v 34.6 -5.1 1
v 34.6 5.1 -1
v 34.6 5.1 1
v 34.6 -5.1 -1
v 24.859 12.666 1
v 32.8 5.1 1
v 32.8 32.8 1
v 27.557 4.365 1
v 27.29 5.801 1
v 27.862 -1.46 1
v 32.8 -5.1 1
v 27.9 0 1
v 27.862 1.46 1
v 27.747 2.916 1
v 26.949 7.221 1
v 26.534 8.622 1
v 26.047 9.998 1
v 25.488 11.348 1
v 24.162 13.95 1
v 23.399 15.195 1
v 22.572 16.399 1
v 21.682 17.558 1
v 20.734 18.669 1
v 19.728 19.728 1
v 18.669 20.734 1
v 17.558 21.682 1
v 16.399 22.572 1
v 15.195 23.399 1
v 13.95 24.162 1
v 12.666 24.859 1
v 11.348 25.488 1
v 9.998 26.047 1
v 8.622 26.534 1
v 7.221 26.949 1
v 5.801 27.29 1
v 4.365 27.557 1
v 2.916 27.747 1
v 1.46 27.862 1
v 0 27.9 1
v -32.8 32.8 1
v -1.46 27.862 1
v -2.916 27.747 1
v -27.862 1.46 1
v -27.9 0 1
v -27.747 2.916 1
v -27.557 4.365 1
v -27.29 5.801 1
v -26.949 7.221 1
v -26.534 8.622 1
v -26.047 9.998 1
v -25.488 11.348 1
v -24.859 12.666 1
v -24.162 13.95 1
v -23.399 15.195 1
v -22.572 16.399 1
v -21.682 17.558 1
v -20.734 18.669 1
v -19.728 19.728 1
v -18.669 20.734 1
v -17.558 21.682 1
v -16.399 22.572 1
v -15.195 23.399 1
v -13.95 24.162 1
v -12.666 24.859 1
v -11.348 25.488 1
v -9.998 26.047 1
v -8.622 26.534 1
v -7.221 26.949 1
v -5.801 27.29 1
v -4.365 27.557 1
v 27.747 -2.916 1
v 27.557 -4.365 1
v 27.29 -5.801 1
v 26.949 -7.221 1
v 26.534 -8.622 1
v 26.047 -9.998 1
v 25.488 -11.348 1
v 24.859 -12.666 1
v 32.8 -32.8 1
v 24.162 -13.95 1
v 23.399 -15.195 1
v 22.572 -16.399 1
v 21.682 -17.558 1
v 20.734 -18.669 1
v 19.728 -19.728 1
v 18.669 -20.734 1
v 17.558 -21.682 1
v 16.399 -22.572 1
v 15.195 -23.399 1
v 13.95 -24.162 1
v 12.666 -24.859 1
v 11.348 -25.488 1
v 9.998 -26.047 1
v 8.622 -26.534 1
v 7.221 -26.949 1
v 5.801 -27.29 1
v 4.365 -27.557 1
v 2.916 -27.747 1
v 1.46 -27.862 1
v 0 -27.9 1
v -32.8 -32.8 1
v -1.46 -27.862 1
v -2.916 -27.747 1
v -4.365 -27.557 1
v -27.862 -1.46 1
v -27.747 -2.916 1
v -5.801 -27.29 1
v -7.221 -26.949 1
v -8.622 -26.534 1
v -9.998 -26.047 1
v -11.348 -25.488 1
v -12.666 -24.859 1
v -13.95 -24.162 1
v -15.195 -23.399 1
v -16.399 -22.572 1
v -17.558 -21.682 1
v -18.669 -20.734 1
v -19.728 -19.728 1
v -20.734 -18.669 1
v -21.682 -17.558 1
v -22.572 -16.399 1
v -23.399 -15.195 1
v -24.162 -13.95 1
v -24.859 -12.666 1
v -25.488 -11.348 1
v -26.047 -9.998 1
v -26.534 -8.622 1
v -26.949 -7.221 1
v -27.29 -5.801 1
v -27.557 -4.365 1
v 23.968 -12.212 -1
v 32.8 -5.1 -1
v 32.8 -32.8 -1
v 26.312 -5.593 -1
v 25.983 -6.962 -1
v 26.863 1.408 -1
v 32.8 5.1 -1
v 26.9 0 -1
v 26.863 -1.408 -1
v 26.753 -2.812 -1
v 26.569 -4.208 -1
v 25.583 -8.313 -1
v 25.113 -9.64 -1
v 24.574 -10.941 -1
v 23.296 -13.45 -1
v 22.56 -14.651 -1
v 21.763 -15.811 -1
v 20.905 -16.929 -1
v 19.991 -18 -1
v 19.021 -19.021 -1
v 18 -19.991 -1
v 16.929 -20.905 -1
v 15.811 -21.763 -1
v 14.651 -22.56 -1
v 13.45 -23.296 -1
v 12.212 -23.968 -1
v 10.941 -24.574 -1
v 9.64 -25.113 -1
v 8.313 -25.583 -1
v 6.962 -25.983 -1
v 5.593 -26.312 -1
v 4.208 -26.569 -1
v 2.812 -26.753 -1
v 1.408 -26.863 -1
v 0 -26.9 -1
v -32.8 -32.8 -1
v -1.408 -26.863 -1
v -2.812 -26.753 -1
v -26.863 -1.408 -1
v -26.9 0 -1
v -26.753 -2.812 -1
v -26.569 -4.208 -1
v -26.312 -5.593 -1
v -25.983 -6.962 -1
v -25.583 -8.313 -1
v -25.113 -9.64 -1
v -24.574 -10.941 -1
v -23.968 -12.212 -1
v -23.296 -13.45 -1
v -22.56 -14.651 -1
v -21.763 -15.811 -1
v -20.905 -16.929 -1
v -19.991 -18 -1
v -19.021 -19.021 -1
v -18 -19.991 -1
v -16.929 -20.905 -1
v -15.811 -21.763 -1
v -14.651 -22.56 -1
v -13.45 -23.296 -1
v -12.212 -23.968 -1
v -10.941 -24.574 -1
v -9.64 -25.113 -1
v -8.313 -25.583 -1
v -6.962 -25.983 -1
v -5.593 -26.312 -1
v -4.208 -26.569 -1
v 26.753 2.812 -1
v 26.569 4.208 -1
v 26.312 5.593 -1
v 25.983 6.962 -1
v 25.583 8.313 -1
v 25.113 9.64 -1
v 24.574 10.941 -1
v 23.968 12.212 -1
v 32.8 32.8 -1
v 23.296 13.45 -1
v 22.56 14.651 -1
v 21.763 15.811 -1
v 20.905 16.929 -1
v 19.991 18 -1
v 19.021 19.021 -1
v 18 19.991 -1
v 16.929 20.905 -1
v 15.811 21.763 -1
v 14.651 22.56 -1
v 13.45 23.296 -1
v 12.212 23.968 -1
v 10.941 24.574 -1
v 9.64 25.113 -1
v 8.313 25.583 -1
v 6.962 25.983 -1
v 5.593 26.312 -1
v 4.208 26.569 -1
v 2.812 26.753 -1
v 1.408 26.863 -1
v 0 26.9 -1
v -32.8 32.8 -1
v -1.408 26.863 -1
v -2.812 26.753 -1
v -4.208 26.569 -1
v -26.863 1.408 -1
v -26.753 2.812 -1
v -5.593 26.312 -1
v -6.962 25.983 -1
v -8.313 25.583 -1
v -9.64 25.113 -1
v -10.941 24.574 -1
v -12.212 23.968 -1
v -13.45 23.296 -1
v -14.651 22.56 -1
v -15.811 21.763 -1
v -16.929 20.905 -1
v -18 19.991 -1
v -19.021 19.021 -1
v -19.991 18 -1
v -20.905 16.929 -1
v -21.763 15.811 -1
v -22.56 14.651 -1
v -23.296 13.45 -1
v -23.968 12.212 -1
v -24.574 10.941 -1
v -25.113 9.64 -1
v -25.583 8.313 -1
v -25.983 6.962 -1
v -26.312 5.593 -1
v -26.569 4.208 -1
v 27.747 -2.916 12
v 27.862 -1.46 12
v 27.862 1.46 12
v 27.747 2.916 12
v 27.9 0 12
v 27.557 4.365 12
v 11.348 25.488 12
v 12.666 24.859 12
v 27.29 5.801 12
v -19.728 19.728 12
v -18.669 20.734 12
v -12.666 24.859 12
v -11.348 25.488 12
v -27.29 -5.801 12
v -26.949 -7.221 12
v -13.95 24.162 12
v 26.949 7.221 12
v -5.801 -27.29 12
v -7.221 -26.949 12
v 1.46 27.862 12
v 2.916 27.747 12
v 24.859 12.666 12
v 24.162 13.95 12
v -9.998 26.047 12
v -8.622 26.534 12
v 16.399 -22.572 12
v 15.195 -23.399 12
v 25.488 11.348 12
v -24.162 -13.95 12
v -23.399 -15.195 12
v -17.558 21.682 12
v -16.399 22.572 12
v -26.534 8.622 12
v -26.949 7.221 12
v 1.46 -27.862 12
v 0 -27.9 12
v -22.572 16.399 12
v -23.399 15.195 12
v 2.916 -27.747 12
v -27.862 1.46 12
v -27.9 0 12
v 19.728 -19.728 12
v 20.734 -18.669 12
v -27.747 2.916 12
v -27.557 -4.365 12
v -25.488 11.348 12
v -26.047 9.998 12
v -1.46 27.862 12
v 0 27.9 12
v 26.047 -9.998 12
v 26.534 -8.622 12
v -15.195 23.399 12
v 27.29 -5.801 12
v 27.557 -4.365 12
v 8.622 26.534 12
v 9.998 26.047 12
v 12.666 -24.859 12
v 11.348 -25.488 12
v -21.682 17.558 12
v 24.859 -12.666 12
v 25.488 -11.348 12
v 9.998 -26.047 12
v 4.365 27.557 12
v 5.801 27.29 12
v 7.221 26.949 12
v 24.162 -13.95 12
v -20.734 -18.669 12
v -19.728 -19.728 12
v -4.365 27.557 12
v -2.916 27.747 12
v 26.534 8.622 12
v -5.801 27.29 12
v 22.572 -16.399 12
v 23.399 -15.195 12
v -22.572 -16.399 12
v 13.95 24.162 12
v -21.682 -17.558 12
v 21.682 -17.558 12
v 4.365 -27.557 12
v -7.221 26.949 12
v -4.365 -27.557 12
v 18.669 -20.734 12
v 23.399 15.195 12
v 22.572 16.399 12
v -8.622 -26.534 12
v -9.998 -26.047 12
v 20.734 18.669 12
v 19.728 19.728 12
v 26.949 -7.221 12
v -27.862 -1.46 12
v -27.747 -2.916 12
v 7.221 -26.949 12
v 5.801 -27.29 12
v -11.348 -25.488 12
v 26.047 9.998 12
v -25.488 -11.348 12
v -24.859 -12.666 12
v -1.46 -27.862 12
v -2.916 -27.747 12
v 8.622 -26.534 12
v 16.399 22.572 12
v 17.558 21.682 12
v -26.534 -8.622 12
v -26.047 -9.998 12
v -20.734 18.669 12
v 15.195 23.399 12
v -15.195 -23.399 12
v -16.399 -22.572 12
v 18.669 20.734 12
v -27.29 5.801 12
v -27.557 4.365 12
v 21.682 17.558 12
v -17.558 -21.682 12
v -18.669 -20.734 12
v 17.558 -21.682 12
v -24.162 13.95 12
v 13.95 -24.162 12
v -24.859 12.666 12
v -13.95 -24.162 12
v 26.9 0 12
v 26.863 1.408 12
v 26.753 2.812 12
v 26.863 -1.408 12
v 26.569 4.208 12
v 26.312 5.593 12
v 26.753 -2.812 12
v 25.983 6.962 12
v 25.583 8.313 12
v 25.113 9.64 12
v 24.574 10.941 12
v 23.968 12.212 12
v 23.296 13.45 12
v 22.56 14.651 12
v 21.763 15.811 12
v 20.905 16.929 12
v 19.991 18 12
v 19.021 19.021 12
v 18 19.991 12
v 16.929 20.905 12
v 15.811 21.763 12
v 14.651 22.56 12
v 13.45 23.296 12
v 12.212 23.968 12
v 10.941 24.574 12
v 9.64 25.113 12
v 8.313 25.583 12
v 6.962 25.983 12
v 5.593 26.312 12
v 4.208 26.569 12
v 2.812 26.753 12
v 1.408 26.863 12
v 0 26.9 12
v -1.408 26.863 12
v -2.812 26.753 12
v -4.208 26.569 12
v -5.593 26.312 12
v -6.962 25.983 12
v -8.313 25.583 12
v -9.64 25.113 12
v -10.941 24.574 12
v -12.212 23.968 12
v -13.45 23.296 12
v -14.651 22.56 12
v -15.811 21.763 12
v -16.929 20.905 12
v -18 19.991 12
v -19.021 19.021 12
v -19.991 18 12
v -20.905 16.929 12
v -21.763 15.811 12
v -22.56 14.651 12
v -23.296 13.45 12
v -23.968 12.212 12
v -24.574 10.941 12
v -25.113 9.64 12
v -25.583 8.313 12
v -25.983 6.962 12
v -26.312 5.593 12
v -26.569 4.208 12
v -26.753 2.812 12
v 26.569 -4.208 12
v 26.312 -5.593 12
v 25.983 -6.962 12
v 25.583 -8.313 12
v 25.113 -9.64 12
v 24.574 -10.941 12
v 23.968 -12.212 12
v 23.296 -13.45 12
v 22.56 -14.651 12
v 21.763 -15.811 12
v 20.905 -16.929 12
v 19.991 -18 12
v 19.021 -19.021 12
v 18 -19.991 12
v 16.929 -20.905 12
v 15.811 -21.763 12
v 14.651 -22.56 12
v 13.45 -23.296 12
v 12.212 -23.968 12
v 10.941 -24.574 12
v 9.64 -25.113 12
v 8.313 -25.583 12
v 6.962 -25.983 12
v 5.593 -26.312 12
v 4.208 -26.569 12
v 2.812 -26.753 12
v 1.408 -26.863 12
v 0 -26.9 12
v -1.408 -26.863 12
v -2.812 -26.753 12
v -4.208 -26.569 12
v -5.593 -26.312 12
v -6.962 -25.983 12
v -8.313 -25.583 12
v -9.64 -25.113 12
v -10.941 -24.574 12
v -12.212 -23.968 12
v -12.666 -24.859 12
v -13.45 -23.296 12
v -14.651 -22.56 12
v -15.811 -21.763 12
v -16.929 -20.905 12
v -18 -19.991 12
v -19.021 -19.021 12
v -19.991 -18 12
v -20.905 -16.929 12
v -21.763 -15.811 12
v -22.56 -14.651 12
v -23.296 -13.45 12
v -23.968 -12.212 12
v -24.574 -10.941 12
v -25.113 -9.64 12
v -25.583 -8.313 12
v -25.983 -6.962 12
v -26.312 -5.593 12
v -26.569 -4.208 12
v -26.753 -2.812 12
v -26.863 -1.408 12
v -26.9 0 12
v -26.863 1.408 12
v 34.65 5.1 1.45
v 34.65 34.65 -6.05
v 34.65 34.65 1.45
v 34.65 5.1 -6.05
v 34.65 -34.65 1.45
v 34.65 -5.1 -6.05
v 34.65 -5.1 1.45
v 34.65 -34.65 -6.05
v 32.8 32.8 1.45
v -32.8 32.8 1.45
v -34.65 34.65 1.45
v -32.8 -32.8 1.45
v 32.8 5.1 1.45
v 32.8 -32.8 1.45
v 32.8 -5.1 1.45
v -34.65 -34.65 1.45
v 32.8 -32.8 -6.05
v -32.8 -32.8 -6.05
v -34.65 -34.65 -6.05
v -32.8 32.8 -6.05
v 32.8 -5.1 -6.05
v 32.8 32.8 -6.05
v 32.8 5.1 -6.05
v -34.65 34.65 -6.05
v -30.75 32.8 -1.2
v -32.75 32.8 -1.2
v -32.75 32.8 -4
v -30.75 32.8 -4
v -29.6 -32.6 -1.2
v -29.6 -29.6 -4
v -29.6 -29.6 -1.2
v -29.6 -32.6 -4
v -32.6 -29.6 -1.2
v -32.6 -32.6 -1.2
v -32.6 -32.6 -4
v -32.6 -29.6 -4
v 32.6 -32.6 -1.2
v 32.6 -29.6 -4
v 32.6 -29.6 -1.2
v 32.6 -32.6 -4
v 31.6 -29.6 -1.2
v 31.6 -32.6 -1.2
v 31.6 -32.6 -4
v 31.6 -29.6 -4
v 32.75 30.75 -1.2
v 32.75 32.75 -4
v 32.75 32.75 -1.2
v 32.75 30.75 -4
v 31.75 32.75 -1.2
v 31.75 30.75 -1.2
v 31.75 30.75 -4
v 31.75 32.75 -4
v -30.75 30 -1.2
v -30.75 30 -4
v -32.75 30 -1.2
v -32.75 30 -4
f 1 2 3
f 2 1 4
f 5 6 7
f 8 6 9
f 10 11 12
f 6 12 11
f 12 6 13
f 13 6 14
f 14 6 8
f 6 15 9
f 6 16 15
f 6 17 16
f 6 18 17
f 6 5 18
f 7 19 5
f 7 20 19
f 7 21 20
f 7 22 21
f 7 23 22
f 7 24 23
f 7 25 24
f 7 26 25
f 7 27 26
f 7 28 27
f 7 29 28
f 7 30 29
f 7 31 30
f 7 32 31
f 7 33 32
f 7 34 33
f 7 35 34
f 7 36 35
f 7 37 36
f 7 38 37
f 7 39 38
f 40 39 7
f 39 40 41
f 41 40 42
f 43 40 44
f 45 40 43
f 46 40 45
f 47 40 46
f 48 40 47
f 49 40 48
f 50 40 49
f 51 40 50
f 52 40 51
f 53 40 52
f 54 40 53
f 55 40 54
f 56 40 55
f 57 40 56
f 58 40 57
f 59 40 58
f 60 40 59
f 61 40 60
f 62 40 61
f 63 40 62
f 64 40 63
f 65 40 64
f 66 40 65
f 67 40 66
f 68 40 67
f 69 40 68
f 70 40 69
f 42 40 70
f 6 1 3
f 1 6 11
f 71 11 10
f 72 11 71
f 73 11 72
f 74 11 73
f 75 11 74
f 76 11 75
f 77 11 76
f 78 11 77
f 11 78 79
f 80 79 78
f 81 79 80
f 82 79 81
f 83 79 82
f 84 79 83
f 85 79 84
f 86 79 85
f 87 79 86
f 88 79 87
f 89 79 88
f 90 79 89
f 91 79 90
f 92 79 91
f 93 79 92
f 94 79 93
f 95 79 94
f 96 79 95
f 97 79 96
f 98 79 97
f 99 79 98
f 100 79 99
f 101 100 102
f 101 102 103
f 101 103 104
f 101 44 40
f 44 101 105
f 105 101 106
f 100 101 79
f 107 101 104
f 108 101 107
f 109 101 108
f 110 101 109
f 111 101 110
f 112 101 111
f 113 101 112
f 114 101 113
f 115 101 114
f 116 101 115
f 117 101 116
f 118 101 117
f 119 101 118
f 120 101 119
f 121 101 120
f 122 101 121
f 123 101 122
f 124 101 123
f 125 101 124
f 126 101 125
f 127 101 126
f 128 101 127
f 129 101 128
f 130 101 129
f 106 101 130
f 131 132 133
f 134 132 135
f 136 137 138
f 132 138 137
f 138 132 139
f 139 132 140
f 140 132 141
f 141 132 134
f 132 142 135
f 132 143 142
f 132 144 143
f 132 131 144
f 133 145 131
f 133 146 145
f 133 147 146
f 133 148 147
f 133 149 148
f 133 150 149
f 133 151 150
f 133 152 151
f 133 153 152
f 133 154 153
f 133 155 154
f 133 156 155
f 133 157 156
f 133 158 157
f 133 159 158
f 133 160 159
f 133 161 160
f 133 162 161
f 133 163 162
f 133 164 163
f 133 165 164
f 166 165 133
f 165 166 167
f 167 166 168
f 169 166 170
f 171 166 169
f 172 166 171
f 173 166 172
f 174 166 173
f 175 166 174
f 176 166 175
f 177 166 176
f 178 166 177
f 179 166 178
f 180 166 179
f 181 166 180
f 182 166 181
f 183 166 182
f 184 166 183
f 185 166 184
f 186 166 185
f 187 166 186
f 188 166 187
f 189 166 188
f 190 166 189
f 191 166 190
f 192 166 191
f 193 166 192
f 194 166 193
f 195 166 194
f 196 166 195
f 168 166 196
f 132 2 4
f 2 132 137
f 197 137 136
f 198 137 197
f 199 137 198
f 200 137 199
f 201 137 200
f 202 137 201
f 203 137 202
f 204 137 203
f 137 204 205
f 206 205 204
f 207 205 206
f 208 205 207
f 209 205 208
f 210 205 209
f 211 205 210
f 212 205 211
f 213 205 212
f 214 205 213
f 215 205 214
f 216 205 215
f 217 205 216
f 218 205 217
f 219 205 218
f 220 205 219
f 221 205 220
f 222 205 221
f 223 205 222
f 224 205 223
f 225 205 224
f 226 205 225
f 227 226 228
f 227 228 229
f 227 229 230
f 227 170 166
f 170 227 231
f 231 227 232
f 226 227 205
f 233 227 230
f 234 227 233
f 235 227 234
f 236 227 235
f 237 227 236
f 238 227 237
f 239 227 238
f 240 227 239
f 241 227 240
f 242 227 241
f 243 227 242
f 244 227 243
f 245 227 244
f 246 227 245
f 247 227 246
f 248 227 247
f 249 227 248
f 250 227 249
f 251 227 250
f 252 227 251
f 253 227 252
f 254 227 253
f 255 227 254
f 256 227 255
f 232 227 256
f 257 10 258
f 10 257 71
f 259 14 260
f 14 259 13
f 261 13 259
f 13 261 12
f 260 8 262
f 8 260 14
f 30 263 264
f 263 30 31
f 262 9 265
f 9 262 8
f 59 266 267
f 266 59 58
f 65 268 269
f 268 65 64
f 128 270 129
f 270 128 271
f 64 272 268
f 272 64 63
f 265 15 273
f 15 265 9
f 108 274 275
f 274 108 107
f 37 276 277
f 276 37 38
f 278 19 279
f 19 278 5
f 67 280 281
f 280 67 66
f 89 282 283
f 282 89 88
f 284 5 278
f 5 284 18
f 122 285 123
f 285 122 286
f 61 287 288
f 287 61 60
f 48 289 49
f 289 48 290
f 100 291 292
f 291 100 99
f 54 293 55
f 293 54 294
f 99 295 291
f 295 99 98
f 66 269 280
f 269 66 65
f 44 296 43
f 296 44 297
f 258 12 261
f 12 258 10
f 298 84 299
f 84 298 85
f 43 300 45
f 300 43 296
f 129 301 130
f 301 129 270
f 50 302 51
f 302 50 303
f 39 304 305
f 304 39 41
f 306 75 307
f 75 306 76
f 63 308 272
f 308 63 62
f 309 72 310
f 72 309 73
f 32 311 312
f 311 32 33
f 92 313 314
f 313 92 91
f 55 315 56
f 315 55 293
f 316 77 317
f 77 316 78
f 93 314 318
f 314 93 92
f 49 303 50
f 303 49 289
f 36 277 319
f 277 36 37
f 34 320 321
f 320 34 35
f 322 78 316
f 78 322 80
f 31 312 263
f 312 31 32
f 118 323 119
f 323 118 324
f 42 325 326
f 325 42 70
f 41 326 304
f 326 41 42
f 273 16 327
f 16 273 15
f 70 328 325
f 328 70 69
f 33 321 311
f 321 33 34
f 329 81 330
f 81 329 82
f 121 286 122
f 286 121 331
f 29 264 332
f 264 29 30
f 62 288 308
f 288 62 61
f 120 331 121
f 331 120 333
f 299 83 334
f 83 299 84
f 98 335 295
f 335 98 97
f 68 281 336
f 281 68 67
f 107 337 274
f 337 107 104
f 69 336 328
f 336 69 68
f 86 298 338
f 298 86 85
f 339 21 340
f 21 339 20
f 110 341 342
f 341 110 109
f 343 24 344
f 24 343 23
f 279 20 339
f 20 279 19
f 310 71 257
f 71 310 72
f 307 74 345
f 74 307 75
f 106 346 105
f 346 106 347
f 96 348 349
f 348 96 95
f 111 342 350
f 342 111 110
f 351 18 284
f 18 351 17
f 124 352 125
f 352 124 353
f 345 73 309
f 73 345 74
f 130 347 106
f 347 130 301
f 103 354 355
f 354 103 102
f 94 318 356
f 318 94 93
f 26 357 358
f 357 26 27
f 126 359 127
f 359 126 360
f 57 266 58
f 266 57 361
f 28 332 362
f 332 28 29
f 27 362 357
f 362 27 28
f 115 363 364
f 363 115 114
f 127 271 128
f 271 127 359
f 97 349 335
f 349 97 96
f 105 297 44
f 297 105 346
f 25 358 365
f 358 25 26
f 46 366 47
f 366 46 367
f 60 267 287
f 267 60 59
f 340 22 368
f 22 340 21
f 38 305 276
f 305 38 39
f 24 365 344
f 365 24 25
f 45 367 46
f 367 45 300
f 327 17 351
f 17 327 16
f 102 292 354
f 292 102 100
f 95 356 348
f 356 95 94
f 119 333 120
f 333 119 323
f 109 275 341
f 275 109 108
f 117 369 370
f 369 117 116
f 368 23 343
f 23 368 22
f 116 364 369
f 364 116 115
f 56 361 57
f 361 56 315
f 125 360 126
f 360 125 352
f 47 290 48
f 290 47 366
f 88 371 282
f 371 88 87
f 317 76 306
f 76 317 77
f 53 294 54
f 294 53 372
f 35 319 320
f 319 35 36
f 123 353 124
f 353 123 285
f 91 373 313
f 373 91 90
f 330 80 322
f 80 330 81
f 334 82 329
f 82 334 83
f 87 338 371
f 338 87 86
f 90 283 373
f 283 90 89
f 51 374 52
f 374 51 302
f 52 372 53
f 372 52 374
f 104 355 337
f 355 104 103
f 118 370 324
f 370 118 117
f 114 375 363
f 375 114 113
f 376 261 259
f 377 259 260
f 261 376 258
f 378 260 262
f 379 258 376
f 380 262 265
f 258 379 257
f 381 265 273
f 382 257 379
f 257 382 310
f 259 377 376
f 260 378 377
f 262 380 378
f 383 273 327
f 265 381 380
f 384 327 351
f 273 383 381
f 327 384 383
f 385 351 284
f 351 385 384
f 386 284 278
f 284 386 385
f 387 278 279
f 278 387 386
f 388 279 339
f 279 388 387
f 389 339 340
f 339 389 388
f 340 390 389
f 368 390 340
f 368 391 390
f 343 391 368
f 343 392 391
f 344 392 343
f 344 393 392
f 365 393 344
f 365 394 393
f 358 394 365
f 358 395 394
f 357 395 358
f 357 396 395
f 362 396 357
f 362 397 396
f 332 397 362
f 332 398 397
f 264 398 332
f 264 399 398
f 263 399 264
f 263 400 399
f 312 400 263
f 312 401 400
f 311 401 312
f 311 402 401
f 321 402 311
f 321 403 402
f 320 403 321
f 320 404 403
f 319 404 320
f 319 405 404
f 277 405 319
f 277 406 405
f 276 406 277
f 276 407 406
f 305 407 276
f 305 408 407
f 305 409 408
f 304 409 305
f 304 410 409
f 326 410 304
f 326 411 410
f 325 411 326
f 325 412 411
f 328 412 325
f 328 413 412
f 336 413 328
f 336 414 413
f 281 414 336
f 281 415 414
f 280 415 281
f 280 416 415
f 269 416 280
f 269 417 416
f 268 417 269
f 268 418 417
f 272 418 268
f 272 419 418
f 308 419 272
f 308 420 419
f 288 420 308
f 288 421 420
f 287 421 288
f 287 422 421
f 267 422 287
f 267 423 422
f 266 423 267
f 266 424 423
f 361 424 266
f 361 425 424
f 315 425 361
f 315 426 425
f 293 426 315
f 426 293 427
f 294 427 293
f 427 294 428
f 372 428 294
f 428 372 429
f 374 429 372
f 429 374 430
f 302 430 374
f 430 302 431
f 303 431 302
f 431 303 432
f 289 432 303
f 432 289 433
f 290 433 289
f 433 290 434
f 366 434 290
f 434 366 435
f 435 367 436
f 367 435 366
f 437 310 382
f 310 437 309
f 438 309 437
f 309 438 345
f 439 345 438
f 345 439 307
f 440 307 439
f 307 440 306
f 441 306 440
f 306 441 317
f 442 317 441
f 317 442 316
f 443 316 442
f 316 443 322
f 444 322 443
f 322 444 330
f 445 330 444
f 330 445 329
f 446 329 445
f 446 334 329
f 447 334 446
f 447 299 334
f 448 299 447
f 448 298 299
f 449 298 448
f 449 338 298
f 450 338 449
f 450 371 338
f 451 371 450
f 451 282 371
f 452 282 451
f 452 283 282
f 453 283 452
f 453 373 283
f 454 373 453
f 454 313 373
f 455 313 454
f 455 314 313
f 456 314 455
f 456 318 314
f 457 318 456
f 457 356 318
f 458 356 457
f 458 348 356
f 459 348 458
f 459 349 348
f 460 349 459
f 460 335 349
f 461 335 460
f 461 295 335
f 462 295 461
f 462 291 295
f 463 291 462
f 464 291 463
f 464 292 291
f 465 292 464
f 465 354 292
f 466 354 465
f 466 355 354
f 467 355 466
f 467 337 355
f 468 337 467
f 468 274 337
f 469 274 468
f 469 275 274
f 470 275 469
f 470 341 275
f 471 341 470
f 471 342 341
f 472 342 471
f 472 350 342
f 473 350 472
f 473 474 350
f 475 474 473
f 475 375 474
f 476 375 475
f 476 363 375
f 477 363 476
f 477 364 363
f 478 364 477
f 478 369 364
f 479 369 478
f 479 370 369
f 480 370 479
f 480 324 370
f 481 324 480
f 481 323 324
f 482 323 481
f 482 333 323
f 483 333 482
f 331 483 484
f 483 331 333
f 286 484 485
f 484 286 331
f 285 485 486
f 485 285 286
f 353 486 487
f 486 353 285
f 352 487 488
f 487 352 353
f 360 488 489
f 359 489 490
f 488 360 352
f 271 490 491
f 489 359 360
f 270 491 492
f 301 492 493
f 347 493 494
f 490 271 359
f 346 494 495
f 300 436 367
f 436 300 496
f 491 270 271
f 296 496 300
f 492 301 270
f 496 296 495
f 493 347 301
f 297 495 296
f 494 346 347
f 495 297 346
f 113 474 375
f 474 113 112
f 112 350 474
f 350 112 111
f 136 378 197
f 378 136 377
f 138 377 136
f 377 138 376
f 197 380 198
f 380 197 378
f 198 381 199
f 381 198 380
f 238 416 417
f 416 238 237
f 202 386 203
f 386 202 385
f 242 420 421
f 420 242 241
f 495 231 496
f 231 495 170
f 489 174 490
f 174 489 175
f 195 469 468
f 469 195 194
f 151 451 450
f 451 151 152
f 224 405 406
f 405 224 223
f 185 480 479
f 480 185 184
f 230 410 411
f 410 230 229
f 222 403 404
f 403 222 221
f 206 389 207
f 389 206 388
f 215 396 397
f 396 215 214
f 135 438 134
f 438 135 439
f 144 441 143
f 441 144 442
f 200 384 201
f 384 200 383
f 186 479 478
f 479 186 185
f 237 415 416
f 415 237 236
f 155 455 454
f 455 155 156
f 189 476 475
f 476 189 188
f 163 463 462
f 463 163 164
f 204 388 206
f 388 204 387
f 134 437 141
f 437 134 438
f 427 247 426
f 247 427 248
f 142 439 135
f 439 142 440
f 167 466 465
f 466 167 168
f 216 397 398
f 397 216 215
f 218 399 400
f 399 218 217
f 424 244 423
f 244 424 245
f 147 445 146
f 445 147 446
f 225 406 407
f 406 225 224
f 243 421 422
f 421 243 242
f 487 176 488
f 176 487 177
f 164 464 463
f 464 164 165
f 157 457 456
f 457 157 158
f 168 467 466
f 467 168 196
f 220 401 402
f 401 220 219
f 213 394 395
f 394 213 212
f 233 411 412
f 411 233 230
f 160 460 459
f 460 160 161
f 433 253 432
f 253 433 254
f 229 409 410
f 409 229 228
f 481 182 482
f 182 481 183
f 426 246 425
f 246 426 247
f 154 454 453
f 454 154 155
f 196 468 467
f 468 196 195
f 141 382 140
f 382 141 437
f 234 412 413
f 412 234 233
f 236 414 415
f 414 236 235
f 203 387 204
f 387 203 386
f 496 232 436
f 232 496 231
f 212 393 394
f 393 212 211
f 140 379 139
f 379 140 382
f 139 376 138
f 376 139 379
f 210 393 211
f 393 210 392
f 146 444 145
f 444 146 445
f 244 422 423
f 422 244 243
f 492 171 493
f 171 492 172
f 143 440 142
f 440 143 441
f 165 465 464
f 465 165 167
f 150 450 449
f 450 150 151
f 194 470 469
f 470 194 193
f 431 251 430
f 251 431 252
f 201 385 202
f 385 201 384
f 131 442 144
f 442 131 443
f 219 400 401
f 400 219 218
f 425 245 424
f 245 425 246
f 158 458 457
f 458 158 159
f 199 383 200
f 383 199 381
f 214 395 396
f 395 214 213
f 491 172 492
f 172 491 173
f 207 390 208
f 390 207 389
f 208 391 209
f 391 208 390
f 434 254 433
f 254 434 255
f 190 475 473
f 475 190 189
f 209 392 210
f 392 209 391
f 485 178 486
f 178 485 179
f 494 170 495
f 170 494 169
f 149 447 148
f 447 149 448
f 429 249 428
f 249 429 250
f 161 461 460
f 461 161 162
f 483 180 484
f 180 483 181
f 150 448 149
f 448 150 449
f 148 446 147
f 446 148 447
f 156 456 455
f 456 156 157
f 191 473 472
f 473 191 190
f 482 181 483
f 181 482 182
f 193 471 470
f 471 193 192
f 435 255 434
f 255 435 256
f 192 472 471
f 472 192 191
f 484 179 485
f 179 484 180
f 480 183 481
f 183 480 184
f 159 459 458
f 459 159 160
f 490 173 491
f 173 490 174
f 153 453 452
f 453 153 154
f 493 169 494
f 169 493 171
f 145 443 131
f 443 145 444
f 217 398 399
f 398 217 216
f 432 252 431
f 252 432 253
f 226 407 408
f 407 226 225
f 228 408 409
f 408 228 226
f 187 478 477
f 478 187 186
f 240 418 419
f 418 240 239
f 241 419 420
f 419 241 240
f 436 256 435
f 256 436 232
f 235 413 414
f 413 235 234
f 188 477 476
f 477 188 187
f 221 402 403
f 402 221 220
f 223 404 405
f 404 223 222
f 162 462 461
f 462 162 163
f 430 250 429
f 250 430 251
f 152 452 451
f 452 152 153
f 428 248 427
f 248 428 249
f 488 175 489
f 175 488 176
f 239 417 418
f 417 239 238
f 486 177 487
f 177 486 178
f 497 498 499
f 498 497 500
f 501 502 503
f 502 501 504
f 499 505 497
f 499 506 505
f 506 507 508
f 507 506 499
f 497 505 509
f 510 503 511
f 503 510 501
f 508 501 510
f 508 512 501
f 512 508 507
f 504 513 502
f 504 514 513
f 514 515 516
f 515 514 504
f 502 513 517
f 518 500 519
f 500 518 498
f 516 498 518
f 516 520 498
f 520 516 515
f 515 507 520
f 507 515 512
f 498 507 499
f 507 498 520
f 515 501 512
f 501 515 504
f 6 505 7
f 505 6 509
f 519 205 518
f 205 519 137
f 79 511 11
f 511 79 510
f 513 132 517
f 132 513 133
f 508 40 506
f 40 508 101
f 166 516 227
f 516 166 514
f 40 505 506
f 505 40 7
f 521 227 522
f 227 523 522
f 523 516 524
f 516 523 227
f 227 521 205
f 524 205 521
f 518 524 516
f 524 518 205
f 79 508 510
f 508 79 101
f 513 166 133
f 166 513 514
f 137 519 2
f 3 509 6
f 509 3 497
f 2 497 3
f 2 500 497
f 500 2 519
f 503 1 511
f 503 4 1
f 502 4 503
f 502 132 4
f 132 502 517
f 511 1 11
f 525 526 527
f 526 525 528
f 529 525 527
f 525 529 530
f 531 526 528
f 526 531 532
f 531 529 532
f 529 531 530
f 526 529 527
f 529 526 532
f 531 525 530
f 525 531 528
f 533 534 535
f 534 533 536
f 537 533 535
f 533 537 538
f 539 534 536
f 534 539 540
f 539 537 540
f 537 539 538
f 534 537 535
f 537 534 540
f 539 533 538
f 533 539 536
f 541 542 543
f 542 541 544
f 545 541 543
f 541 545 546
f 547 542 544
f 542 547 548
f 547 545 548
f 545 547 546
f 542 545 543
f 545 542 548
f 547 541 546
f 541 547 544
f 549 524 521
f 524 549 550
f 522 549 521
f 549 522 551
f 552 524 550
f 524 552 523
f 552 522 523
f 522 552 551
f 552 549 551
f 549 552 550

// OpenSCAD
dicke_size=2;
d=53.8;
r=d/2;
$fn=120;
size=65.2;
translate([-size/2-dicke_size+2,-size/2-dicke_size+2,-dicke_size*2]) cube([3,3,dicke_size+0.8]);
translate([size/2-dicke_size+1,-size/2-dicke_size+2,-dicke_size*2]) cube([1,3,dicke_size+0.8]);
translate([size/2-dicke_size+1.15,size/2-dicke_size+0.15,-dicke_size*2]) cube([1,2,dicke_size+0.8]);
translate([-size/2-dicke_size+1.85,size/2-dicke_size-0.6,-dicke_size*2]) cube([2,3,dicke_size+0.8]);
module zylinder1(size=65)     {
    cylinder(h = 12, r1 = r+1, r2 = r+1, center = false);   }   
module zylinder2(){
    cylinder(h = 60, r1 = r, r2 = r, center = true);    } 
module schleuse() {
    cube([size+4, size+4, dicke_size], center=true);
    translate([size/2,0,0]);}  
module A() {
module hut() {
   schleuse();
   zylinder1();}
   difference (){
     hut();
     zylinder2();}}
module rand(sizeR=65) {
 translate([0,0,-2.3])
    difference(){
      cube([sizeR+4.3, sizeR+4.3, 7.5], center=true);
      cube([sizeR+0.6, sizeR+0.6, 7.5], center=true);}}
module randloch(){
 
   difference(){
     rand(); 
     translate([30,0,-2.3])  
     cube([60,10.2,50], center=true);  }}
// main
A();
randloch();
   
